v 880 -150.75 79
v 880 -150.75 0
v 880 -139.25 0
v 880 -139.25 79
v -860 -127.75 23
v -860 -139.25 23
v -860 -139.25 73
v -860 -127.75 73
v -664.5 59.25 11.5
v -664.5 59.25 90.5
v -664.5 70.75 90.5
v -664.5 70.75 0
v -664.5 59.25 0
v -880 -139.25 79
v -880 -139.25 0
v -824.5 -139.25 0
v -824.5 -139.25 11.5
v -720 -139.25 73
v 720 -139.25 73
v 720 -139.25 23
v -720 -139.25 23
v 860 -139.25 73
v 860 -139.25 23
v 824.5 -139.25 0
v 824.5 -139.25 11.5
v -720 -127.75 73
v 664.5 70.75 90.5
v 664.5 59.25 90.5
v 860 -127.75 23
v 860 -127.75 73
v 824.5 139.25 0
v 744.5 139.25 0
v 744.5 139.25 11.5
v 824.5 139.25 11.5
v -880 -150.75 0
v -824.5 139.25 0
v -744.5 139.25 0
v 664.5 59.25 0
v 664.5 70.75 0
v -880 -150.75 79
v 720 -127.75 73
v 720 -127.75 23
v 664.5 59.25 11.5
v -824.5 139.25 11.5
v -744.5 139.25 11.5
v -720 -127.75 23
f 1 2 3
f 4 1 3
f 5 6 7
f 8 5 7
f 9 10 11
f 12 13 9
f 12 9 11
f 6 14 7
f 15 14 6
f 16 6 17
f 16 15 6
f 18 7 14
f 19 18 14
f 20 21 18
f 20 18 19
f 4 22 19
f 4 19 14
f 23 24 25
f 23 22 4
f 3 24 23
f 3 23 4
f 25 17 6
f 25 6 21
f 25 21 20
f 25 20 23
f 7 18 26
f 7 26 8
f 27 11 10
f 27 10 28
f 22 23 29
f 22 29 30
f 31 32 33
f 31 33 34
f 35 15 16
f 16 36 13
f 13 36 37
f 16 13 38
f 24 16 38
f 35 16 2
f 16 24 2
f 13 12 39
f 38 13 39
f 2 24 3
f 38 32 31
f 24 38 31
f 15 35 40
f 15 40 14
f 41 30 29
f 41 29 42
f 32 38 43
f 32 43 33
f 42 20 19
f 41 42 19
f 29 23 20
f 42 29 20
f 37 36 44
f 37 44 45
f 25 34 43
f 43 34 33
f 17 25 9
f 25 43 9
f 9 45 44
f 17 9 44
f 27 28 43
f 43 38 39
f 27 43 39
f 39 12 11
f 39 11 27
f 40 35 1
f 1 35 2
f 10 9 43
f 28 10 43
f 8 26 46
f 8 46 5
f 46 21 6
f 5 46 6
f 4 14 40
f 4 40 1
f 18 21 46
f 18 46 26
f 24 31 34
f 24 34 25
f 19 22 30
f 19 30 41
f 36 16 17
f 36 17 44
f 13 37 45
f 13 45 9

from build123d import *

# Parameters (mm, degrees)
EXTRUDE_562_DEPTH    = 11.5
EXTRUDE_7_DEPTH      = 79
EXTRUDE_7_DEPTH_BACK = 11.5
SKETCH_2_W           = 1329
SKETCH_2_H           = 11.5
EXTRUDE_9_DEPTH      = 67.5
EXTRUDE_9_DEPTH_BACK = 11.5
SKETCH_3_W           = 1760
SKETCH_3_H           = 11.5
SKETCH_4_W           = 140
SKETCH_4_H           = 50
EXTRUDE_10_DEPTH     = 11.5


with BuildPart() as part:
    # 草图1 → Extrude 562 (new body)
    with BuildSketch(Plane.XY):
        Polygon((-744.5, 139.25), (-664.5, 59.25), (664.5, 59.25), (744.5, 139.25), (824.5, 139.25), (824.5, -139.25), (-824.5, -139.25), (-824.5, 139.25), align=None)
    extrude(amount=EXTRUDE_562_DEPTH)

    # 草图2 → 凸台-拉伸7 (add, two sides: drawn at the far end of the back side and taken through both)
    with BuildSketch(Plane.XY.offset(11.5).offset(-EXTRUDE_7_DEPTH_BACK)):
        with Locations((0, 65)):
            Rectangle(SKETCH_2_W, SKETCH_2_H)
    extrude(amount=EXTRUDE_7_DEPTH + EXTRUDE_7_DEPTH_BACK)

    # 草图3 → 凸台-拉伸9 (add, two sides: drawn at the far end of the back side and taken through both)
    with BuildSketch(Plane.XY.offset(11.5).offset(-EXTRUDE_9_DEPTH_BACK)):
        with Locations((0, -145)):
            Rectangle(SKETCH_3_W, SKETCH_3_H)
    extrude(amount=EXTRUDE_9_DEPTH + EXTRUDE_9_DEPTH_BACK)

    # 草图4 → 凸台-拉伸10 (add)
    with BuildSketch(Plane(origin=(0, -139.25, 0), x_dir=(-1, 0, 0), z_dir=(0, 1, 0))):
        with Locations((-790, 48)):
            Rectangle(SKETCH_4_W, SKETCH_4_H)
        with Locations((790, 48)):
            Rectangle(SKETCH_4_W, SKETCH_4_H)
    extrude(amount=EXTRUDE_10_DEPTH)


solid = part.part
